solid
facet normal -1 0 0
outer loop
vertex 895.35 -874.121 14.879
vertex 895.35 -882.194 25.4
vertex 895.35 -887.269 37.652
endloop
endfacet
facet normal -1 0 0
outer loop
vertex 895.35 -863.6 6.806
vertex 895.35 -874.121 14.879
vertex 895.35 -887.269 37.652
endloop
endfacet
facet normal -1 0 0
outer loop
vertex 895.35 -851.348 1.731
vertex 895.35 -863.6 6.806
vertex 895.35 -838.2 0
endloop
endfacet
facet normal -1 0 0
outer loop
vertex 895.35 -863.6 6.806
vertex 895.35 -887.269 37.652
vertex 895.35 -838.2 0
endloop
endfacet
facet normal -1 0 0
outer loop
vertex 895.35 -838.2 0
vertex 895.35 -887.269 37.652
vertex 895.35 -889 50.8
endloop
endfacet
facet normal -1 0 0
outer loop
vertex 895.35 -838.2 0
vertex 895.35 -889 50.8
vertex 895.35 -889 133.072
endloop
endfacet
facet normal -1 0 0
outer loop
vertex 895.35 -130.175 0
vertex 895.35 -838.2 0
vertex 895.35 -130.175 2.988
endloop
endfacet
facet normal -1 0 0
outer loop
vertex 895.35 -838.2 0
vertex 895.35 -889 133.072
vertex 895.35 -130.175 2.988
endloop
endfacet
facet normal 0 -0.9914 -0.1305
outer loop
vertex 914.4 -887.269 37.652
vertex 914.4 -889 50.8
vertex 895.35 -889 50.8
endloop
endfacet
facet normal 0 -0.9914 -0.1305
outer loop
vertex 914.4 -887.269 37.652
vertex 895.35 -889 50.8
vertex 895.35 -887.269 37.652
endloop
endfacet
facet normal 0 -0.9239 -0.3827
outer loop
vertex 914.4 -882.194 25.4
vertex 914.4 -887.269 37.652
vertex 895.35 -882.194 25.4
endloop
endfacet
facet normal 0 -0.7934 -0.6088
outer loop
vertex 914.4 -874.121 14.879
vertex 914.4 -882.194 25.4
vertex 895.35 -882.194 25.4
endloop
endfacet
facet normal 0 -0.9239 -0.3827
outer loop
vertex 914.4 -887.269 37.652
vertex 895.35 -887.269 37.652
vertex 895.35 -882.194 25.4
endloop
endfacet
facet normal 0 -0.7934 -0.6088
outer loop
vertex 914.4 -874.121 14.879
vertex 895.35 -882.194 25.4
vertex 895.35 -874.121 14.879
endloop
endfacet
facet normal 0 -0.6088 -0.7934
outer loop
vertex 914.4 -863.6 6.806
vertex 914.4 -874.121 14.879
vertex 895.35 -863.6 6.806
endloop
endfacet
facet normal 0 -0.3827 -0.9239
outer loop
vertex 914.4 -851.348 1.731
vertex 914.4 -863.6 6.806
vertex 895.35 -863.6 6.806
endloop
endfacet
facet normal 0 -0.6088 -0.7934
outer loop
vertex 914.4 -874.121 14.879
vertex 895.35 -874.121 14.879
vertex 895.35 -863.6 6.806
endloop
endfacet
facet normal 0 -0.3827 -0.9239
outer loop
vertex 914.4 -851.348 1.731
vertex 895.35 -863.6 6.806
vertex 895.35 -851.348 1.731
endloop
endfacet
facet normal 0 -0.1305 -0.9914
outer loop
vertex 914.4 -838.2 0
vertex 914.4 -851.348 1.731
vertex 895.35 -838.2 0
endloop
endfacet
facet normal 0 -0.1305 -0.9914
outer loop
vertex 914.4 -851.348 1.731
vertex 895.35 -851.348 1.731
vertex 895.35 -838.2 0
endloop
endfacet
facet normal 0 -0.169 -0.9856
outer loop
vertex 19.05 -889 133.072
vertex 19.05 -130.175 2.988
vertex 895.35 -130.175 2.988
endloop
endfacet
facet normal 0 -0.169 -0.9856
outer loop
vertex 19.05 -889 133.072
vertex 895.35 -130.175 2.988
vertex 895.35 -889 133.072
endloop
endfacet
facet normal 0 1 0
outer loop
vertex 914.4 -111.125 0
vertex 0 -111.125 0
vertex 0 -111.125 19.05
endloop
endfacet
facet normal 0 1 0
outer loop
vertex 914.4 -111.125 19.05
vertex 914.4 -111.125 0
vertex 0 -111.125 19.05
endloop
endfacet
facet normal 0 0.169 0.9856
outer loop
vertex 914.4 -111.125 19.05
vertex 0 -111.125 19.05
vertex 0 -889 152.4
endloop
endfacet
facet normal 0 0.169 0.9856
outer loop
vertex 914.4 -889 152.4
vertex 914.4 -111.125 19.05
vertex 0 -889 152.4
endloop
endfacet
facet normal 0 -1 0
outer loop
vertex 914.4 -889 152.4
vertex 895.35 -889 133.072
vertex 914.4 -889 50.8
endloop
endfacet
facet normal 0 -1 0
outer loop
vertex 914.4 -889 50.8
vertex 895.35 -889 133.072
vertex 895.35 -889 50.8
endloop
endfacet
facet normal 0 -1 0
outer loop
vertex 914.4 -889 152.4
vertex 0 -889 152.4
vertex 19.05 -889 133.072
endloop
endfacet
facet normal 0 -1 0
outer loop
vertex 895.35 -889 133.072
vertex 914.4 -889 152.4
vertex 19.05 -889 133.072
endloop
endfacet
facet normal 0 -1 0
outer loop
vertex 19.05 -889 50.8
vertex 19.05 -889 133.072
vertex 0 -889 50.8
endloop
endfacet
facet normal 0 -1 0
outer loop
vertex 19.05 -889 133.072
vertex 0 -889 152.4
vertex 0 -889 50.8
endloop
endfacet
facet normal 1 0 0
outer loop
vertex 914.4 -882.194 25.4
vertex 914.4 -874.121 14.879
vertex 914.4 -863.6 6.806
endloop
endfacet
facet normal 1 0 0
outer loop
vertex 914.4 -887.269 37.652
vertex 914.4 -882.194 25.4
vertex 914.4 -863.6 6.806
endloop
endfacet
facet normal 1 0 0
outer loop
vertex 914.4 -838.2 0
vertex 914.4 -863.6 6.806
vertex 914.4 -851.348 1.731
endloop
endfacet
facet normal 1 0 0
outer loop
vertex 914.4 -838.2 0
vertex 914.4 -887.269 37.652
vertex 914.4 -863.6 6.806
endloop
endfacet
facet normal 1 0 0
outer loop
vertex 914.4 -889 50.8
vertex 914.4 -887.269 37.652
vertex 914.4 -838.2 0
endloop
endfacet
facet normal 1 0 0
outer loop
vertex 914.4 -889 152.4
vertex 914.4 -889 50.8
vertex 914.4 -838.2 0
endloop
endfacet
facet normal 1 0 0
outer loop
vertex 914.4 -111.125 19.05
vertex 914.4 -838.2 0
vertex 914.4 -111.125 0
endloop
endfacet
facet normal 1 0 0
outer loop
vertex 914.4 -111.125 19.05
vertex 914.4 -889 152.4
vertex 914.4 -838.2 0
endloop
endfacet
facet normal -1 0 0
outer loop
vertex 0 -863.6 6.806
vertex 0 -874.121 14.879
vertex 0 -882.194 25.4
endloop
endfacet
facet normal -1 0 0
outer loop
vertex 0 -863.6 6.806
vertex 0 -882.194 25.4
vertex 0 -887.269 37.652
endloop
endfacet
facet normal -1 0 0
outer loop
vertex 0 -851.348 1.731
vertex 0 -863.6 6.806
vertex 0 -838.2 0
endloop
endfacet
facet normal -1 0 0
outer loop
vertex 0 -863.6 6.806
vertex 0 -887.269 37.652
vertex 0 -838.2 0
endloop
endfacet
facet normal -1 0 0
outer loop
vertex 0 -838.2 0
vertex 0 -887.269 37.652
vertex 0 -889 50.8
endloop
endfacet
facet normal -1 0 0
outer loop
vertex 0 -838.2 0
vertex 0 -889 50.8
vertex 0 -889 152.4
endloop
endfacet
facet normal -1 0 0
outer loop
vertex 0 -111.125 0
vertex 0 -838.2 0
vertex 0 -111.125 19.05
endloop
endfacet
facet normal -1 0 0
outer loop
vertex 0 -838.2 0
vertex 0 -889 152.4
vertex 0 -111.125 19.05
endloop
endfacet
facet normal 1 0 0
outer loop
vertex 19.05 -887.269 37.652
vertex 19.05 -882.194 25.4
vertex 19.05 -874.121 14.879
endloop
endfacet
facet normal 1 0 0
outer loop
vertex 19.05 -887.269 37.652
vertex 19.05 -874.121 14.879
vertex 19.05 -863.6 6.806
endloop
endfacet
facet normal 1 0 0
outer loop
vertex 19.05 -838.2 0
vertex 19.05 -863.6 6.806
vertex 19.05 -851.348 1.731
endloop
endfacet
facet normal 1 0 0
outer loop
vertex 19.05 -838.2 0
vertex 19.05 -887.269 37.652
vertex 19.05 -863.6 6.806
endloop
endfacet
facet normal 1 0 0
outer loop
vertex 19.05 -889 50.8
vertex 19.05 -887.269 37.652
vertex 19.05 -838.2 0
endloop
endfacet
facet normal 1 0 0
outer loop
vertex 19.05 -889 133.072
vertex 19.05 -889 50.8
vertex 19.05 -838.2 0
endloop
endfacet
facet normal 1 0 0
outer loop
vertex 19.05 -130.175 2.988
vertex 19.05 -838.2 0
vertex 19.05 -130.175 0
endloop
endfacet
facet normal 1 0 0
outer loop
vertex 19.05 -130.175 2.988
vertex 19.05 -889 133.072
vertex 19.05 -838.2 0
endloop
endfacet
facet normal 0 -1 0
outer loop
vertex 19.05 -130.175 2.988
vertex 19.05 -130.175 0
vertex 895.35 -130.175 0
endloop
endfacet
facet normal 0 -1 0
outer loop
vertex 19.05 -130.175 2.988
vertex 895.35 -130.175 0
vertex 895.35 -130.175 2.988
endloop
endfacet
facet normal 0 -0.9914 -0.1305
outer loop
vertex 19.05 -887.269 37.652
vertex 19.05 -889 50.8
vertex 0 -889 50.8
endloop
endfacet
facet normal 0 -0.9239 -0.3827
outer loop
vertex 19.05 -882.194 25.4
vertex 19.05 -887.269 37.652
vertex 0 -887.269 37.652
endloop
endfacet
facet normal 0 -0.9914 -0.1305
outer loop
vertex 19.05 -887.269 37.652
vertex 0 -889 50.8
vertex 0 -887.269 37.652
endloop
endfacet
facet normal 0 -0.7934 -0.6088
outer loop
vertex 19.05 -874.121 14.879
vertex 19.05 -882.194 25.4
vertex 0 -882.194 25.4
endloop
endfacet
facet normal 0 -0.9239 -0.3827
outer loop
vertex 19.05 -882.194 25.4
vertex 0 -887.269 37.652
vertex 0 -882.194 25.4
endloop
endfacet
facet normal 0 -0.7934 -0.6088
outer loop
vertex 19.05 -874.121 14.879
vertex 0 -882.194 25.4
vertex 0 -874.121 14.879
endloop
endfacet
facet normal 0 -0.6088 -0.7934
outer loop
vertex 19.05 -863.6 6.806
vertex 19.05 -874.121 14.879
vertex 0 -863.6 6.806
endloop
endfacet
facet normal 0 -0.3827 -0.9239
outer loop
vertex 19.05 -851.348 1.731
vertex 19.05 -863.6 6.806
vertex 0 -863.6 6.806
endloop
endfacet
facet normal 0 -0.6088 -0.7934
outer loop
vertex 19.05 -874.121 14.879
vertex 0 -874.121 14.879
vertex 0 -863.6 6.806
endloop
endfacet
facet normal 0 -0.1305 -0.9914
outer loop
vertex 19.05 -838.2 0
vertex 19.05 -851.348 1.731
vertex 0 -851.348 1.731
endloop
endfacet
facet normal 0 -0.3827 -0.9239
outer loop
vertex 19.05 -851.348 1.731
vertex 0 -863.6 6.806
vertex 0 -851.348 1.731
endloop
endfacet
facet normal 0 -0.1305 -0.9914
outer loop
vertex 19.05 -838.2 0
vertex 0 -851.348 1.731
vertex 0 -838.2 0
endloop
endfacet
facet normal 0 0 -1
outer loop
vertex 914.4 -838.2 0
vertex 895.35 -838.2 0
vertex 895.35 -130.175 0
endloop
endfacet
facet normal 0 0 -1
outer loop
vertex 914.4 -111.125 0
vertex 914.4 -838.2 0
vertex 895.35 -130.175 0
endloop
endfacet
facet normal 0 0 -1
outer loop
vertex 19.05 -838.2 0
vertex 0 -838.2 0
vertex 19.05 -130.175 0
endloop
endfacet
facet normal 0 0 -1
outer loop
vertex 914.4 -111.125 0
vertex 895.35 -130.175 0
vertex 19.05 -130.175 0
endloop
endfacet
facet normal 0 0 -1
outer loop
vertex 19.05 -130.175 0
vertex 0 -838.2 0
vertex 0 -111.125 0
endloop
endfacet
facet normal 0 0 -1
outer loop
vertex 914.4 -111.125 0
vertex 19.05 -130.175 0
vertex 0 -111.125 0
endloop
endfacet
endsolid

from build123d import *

# Parameters (mm, degrees)
F1_DEPTH = 914.4
F2_T     = -19.05


with BuildPart() as f1:
    # F0 (on Right) → F1 (new body)
    with BuildSketch(Plane.YZ):
        with BuildLine():
            Line((-889, 152.4), (-889, 50.8))
            ThreePointArc((-889, 50.8), (-874.121024, 14.878976), (-838.2, 0))
            Line((-838.2, 0), (-111.125, 0))
            Line((-111.125, 0), (-111.125, 19.05))
            Line((-111.125, 19.05), (-889, 152.4))
        make_face()
    extrude(amount=F1_DEPTH)

    # F2
    f2_openings = [f1.faces().sort_by_distance(p)[0] for p in [
        (457.2, -474.6625, 0),
        (457.2, -874.121024, 14.878976),
        (457.2, -889, 101.6),
    ]]
    offset(amount=F2_T, openings=f2_openings)


solid = f1.part
